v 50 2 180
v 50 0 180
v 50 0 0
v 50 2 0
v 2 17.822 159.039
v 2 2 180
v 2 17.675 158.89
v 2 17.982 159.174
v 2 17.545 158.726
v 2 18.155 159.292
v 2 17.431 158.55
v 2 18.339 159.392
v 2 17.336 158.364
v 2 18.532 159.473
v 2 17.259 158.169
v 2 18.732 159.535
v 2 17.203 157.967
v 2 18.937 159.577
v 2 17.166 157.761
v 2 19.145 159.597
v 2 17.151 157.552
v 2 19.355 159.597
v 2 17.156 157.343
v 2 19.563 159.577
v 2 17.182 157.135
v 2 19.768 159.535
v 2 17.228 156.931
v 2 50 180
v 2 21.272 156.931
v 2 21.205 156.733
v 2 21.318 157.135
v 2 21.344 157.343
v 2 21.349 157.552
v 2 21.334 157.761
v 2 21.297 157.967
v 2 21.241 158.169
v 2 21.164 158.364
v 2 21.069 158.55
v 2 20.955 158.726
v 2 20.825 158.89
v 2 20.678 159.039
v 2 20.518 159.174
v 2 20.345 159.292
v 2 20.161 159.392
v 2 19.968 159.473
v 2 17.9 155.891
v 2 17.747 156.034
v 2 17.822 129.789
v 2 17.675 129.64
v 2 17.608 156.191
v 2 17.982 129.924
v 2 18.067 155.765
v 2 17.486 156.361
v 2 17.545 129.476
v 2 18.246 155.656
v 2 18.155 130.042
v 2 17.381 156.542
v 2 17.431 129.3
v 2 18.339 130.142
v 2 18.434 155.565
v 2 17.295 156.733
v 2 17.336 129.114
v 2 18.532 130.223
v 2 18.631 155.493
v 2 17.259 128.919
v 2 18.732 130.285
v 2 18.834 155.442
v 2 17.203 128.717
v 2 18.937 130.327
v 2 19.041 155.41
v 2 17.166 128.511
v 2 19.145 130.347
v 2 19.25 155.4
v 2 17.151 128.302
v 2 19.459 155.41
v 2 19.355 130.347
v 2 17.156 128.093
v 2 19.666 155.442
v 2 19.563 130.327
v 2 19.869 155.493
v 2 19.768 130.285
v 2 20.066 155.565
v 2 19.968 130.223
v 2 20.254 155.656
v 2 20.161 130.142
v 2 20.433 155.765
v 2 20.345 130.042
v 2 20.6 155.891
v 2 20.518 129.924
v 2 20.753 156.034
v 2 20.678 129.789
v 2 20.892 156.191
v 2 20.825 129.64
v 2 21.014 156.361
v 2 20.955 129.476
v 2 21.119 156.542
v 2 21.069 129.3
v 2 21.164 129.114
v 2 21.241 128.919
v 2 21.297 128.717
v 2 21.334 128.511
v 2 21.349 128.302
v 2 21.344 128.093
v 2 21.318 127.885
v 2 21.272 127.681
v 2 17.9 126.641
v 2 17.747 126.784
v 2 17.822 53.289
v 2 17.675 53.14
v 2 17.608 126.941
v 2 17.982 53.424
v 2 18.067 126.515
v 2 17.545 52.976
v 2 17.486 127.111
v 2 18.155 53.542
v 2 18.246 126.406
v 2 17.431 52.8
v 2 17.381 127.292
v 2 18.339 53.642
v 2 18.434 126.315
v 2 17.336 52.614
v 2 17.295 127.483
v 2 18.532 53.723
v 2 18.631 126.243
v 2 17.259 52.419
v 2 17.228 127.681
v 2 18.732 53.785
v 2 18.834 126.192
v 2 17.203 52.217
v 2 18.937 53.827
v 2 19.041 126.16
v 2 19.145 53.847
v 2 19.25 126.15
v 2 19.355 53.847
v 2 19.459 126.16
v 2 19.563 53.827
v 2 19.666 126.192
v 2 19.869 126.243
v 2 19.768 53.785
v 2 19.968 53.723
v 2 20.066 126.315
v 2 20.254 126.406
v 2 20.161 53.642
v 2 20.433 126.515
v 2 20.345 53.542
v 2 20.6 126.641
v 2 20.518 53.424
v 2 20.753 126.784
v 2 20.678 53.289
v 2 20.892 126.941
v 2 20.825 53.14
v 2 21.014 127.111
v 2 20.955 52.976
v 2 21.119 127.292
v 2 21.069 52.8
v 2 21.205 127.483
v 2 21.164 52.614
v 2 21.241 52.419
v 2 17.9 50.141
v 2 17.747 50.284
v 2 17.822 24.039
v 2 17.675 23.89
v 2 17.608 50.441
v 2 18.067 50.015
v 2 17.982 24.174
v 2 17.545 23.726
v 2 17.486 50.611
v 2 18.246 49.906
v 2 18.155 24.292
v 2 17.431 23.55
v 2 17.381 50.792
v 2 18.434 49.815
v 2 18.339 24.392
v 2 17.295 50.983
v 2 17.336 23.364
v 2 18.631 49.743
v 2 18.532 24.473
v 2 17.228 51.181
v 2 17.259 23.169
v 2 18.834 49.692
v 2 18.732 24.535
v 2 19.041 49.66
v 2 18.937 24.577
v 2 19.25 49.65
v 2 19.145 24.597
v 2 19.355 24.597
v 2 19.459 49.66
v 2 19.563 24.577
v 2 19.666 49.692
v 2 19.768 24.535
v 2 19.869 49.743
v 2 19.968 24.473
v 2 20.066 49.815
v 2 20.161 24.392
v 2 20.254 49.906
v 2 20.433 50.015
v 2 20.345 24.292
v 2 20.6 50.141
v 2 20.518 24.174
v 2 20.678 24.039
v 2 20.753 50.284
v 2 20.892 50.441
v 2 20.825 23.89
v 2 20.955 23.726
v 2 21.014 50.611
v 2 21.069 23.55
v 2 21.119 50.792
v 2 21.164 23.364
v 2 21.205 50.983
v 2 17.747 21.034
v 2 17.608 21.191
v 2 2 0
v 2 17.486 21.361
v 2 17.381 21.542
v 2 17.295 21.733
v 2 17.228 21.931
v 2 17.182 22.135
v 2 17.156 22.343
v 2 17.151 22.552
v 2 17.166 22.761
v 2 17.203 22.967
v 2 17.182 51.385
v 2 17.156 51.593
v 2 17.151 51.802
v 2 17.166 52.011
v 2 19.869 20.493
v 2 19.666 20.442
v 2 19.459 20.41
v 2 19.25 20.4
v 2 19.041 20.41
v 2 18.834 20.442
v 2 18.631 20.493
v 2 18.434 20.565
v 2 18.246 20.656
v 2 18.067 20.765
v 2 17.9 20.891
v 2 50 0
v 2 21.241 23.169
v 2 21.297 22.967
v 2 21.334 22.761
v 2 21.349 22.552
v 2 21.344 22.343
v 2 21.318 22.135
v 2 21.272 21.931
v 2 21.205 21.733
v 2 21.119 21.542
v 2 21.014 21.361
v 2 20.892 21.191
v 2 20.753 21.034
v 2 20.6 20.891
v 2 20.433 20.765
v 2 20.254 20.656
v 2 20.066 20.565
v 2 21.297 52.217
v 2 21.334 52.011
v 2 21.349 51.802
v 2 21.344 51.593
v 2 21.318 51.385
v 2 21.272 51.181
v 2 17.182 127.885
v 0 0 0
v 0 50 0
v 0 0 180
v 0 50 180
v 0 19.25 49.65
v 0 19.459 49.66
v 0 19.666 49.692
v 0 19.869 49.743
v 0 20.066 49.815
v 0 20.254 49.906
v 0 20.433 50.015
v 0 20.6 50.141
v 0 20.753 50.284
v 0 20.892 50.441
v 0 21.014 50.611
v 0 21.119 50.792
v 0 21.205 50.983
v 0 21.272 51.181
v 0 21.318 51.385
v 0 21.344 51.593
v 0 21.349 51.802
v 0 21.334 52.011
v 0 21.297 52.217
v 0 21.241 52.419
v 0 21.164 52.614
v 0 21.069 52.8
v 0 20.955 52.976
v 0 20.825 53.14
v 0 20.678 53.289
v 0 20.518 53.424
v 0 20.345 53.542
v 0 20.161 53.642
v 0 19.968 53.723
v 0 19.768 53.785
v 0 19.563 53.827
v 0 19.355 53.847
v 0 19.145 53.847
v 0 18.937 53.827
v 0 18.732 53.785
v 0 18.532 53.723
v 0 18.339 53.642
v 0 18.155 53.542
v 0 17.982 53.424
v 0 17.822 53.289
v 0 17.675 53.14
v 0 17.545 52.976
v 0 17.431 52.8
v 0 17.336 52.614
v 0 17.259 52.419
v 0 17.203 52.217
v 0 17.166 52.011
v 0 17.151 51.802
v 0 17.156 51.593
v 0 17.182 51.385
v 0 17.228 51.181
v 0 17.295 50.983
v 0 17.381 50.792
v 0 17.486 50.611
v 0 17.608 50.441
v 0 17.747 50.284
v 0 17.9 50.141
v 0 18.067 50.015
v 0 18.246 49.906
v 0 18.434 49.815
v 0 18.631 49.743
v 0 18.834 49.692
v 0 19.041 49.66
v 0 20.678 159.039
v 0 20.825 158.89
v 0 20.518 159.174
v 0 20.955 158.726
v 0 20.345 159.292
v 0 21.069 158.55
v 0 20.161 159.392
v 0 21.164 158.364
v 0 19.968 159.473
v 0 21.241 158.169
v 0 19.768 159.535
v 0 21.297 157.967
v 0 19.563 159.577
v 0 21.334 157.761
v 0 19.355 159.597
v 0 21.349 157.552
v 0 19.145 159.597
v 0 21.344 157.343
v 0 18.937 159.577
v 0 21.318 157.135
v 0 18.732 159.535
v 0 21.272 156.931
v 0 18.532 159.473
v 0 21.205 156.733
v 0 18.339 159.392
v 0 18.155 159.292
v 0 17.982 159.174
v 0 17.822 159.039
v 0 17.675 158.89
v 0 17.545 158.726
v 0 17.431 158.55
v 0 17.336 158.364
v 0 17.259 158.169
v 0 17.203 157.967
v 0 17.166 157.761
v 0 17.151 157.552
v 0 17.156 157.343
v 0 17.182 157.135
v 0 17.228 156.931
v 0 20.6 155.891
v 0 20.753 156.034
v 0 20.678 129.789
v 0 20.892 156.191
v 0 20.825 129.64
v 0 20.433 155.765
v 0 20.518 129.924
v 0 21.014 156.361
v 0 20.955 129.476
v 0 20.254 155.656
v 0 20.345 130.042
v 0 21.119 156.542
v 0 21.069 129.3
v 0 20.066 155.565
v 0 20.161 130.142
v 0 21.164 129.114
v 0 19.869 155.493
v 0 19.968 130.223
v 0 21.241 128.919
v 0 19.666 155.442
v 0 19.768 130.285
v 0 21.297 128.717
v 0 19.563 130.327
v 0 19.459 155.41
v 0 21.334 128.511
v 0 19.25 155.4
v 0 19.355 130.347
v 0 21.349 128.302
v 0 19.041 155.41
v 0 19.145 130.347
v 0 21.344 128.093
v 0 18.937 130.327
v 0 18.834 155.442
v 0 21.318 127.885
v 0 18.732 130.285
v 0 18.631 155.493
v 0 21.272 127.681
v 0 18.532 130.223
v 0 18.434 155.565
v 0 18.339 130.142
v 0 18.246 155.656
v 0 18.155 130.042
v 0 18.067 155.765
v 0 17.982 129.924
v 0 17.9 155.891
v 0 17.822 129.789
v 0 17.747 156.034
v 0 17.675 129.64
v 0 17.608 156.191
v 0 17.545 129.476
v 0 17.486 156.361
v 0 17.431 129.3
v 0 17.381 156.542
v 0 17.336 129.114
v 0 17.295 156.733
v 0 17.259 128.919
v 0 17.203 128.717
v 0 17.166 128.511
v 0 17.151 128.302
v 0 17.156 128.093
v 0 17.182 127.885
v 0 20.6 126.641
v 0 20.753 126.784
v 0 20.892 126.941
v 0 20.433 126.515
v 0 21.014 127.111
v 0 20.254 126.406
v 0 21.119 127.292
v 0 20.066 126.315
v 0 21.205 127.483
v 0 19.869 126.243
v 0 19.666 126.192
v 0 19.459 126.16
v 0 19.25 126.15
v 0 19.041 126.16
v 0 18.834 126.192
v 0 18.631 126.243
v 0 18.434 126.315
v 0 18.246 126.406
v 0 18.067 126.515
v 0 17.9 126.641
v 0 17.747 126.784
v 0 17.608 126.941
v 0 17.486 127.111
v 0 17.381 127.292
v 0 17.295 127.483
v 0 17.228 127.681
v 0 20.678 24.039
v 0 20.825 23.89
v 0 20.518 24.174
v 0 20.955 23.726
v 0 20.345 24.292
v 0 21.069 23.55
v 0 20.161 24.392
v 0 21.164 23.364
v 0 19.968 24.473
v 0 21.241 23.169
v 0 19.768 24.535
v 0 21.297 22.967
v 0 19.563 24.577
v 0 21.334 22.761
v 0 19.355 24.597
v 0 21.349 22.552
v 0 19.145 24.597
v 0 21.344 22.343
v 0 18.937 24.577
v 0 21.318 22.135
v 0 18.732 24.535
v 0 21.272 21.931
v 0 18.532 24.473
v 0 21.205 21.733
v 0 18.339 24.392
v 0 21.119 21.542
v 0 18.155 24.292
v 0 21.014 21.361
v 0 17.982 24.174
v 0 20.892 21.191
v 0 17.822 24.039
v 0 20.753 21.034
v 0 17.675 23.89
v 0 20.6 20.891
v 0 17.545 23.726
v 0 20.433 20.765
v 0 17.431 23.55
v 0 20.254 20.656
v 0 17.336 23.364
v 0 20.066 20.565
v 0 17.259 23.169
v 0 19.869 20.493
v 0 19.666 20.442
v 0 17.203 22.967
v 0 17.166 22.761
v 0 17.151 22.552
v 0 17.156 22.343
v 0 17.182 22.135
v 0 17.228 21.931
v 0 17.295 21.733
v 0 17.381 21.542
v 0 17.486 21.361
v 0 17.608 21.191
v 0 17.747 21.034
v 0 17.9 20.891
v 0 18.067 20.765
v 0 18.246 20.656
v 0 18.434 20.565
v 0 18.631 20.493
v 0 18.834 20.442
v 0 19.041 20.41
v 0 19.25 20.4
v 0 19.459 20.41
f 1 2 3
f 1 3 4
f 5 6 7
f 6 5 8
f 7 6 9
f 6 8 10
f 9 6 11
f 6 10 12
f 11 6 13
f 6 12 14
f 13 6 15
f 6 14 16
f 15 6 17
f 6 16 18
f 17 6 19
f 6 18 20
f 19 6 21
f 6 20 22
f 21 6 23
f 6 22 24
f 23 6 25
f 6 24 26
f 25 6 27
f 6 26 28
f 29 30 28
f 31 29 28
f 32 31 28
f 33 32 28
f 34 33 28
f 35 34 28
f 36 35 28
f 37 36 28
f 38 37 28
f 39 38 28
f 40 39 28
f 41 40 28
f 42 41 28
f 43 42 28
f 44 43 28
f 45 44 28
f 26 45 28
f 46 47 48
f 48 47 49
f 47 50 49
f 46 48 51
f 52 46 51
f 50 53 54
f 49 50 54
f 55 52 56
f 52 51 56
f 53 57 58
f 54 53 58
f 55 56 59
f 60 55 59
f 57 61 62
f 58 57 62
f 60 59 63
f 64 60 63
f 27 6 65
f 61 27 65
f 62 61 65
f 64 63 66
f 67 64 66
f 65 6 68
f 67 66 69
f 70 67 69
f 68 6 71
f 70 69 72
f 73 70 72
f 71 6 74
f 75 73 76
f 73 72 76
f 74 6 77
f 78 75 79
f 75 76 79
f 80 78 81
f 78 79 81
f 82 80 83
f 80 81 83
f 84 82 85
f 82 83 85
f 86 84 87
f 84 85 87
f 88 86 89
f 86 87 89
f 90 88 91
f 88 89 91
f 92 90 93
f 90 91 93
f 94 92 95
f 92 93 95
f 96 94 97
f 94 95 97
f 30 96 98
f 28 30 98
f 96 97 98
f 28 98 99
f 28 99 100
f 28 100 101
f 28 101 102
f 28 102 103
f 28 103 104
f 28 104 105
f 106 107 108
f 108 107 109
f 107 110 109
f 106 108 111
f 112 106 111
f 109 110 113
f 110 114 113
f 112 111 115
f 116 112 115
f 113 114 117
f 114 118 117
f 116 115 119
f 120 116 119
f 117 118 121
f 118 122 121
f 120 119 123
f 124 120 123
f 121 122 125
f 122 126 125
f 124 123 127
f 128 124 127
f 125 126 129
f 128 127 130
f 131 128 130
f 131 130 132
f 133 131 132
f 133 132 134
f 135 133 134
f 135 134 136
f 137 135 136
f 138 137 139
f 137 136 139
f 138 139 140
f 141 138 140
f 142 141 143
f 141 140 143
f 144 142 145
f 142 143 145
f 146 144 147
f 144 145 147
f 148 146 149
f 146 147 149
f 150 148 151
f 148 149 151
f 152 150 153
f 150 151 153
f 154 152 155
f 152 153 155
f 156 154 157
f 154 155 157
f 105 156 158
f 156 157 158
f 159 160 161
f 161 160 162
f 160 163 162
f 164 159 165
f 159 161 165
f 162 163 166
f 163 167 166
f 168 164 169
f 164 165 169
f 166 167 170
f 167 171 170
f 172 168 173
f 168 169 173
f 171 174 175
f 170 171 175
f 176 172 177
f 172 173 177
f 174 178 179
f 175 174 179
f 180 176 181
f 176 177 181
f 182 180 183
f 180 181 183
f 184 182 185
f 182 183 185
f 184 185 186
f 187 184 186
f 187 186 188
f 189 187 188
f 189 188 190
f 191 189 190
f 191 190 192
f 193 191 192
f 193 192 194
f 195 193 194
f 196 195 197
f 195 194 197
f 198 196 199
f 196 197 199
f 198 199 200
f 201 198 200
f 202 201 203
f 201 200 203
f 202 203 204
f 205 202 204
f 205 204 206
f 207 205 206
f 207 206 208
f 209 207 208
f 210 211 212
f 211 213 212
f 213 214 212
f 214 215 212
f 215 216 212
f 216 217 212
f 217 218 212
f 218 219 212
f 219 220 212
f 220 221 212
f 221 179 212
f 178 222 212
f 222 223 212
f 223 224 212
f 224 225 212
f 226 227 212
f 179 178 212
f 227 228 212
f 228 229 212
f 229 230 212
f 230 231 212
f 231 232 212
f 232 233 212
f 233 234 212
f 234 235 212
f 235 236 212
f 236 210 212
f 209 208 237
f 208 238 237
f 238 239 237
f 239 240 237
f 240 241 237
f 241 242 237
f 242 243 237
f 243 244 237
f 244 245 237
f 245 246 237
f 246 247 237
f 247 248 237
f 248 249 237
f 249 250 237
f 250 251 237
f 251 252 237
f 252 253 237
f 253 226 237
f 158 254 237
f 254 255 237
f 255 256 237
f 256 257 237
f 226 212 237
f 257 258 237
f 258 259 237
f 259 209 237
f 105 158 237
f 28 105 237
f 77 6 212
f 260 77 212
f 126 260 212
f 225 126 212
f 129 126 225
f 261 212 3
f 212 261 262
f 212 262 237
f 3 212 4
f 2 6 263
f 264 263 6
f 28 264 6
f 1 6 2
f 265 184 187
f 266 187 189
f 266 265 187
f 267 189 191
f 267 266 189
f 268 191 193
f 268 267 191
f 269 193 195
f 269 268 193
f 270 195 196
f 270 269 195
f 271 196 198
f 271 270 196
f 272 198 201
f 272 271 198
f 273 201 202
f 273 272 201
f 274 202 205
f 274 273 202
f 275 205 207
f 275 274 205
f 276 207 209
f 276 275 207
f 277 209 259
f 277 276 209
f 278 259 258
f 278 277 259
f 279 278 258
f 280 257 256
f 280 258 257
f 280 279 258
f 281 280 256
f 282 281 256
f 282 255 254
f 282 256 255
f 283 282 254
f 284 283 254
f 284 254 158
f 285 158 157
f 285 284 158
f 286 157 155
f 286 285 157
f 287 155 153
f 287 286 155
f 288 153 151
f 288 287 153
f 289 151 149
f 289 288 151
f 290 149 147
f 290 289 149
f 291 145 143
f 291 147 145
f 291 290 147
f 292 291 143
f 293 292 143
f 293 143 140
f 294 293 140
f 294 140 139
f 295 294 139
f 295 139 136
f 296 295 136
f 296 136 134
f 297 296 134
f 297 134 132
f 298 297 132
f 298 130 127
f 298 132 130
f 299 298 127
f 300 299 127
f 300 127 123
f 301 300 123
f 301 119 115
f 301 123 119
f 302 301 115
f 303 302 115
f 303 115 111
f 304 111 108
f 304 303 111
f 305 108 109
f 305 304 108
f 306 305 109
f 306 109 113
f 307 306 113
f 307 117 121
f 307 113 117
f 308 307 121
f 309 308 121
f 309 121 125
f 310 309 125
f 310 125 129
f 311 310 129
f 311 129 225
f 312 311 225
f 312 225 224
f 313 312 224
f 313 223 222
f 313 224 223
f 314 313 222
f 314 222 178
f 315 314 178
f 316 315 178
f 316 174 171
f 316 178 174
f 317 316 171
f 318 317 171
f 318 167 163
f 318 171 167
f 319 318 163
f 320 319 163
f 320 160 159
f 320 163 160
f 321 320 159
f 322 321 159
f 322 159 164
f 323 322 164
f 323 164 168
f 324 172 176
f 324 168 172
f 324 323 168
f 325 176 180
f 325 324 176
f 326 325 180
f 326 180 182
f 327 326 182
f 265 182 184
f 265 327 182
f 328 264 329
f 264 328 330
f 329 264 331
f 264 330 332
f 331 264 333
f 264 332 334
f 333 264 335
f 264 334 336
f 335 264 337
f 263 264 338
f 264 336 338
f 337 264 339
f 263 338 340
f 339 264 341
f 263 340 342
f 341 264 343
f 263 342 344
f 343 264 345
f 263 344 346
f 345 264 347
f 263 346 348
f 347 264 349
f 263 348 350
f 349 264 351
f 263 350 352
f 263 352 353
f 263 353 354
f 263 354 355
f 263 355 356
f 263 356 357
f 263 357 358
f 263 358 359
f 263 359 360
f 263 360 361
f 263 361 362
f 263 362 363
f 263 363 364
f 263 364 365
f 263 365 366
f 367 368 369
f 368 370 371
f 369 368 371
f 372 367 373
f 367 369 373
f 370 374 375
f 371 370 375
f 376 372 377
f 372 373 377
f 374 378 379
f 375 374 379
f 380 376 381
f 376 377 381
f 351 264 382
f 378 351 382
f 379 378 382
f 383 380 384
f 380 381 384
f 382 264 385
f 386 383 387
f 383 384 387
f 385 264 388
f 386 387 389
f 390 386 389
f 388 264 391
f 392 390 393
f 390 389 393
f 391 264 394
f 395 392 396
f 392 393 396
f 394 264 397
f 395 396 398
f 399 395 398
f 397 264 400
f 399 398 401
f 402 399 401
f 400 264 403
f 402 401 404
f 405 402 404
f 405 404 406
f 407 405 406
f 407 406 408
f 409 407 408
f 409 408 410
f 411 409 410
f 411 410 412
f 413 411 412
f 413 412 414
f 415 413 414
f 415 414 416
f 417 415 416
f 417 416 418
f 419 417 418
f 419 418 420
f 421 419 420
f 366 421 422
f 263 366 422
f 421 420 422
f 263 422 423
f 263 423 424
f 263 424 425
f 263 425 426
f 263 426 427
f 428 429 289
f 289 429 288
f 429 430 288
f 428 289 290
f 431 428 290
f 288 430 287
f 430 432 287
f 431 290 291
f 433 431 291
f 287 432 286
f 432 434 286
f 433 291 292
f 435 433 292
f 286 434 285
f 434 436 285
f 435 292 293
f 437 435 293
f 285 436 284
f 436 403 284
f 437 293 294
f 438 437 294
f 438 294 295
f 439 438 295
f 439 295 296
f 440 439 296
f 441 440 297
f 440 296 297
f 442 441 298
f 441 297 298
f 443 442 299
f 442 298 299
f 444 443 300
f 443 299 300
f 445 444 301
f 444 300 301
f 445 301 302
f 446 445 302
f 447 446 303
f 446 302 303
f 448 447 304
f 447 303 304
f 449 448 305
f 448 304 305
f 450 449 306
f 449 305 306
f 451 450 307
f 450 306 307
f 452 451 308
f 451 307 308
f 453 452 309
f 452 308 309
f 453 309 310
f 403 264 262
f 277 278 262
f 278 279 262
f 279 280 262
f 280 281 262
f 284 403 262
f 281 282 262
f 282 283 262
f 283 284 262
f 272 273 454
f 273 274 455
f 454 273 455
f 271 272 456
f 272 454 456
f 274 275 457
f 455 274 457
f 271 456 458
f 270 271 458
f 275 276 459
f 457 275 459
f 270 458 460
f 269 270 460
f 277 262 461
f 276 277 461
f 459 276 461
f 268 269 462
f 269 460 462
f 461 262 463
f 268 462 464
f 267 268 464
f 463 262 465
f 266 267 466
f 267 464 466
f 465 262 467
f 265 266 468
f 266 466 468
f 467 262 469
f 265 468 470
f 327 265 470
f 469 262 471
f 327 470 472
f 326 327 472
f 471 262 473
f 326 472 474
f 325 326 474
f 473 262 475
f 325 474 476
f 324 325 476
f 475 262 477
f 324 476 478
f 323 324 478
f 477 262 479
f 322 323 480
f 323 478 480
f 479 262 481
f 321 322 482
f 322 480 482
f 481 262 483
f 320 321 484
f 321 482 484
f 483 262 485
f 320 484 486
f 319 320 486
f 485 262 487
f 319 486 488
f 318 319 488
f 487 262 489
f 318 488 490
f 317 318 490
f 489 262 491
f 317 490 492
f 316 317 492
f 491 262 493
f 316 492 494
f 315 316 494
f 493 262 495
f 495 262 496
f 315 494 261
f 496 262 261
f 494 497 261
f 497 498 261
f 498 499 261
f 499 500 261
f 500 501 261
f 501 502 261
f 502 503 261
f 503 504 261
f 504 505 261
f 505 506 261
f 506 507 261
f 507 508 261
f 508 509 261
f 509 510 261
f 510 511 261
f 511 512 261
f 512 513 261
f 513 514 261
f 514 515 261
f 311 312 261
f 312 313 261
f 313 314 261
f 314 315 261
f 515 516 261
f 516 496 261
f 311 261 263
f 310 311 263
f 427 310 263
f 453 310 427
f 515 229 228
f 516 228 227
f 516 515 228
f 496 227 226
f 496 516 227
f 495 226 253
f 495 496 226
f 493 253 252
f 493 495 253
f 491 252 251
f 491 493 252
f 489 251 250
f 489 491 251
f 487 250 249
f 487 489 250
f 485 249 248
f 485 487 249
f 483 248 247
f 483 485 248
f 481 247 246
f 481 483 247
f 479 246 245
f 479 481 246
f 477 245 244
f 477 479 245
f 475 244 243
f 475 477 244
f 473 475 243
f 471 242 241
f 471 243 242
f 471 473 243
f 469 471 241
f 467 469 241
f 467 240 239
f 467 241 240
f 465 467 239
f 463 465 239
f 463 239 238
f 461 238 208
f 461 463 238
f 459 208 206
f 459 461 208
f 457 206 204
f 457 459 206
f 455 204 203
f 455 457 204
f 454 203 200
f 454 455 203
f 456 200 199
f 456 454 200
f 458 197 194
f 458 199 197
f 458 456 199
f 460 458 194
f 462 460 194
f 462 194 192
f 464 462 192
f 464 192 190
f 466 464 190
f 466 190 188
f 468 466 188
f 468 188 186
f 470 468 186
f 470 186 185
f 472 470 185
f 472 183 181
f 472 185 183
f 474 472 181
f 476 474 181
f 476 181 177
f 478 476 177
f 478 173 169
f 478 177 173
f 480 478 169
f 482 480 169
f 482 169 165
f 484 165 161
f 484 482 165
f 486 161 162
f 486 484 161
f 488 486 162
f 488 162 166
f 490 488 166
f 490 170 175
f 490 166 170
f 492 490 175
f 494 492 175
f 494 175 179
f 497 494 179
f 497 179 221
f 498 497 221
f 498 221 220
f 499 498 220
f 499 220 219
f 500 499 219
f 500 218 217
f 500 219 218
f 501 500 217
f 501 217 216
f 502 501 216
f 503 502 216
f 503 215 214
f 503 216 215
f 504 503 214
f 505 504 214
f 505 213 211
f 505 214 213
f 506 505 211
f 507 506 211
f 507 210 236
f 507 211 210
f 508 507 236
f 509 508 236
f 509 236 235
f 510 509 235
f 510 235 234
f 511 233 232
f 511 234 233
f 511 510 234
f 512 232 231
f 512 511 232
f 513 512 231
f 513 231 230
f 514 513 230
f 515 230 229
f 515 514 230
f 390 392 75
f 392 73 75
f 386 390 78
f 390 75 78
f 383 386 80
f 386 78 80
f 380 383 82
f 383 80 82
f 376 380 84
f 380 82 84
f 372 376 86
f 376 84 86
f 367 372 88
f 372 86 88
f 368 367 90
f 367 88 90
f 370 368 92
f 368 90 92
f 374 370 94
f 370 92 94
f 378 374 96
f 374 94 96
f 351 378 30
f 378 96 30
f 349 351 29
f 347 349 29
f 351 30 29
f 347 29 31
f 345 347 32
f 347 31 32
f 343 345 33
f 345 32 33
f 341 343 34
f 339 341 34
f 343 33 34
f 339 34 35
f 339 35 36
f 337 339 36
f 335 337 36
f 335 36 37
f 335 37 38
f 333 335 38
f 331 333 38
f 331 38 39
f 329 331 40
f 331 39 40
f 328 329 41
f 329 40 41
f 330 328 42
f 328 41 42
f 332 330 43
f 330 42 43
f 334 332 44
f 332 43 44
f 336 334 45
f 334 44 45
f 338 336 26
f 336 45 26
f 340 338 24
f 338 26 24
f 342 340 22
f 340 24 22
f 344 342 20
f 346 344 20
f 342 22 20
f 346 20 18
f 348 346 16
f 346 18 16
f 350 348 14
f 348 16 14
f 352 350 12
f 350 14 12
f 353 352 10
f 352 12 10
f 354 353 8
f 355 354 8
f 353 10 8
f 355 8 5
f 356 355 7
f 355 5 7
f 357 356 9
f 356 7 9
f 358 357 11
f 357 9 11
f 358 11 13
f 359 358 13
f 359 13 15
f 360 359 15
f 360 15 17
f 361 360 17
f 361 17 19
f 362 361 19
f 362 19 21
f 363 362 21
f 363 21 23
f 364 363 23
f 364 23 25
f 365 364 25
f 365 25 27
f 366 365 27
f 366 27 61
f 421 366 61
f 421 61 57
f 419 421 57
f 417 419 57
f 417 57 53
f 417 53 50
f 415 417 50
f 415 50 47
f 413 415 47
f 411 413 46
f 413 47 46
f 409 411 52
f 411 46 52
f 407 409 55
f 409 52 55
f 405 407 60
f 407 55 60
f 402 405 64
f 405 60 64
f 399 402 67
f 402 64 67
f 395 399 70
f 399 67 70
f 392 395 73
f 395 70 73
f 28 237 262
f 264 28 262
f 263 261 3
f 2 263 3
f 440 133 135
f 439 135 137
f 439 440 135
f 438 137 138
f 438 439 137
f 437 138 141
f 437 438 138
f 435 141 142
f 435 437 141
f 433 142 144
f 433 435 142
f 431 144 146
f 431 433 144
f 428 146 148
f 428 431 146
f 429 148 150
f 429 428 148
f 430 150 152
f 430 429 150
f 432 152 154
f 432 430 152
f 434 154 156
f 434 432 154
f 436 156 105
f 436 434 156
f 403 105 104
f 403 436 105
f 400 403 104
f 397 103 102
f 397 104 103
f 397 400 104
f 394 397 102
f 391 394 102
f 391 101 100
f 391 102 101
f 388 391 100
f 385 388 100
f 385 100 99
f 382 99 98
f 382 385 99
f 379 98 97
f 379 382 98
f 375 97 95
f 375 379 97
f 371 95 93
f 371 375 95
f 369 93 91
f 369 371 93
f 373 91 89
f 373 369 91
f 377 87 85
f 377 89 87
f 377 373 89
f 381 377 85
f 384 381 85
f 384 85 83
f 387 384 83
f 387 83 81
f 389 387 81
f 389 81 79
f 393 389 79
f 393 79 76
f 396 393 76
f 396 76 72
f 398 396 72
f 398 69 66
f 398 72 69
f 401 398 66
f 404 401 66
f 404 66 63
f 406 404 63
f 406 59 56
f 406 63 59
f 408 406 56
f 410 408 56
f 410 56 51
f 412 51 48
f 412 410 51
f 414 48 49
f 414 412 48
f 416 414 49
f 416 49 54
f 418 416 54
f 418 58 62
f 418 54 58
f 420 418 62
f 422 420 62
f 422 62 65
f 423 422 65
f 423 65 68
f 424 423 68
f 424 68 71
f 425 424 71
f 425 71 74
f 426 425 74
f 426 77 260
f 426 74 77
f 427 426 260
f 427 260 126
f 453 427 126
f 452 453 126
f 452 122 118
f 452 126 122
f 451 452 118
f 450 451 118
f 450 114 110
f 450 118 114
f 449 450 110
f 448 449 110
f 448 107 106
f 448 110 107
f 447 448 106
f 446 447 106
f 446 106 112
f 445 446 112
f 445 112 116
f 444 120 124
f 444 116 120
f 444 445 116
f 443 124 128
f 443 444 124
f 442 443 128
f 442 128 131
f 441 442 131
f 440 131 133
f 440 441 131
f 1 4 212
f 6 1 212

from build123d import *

# Parameters (mm, degrees)
BOSS_EXTRUDE1_DEPTH = 180
SKETCH2_R           = 2.1
CUT_EXTRUDE1_DEPTH  = 5


with BuildPart() as part:
    # Sketch1 → Boss-Extrude1 (new body)
    with BuildSketch(Plane.XY):
        Polygon((0, 0), (50, 0), (50, 2), (2, 2), (2, 50), (0, 50), align=None)
    extrude(amount=BOSS_EXTRUDE1_DEPTH)

    # Sketch2 → Cut-Extrude1 (cut, symmetric)
    with BuildSketch(Plane(origin=(0, 0, 0), x_dir=(0, 0, -1), z_dir=(1, 0, 0))):
        with Locations((-22.5, 19.25)):
            Circle(SKETCH2_R)
        with Locations((-51.75, 19.25)):
            Circle(SKETCH2_R)
        with Locations((-128.25, 19.25)):
            Circle(SKETCH2_R)
        with Locations((-157.5, 19.25)):
            Circle(SKETCH2_R)
    extrude(amount=CUT_EXTRUDE1_DEPTH, both=True, mode=Mode.SUBTRACT)


solid = part.part
